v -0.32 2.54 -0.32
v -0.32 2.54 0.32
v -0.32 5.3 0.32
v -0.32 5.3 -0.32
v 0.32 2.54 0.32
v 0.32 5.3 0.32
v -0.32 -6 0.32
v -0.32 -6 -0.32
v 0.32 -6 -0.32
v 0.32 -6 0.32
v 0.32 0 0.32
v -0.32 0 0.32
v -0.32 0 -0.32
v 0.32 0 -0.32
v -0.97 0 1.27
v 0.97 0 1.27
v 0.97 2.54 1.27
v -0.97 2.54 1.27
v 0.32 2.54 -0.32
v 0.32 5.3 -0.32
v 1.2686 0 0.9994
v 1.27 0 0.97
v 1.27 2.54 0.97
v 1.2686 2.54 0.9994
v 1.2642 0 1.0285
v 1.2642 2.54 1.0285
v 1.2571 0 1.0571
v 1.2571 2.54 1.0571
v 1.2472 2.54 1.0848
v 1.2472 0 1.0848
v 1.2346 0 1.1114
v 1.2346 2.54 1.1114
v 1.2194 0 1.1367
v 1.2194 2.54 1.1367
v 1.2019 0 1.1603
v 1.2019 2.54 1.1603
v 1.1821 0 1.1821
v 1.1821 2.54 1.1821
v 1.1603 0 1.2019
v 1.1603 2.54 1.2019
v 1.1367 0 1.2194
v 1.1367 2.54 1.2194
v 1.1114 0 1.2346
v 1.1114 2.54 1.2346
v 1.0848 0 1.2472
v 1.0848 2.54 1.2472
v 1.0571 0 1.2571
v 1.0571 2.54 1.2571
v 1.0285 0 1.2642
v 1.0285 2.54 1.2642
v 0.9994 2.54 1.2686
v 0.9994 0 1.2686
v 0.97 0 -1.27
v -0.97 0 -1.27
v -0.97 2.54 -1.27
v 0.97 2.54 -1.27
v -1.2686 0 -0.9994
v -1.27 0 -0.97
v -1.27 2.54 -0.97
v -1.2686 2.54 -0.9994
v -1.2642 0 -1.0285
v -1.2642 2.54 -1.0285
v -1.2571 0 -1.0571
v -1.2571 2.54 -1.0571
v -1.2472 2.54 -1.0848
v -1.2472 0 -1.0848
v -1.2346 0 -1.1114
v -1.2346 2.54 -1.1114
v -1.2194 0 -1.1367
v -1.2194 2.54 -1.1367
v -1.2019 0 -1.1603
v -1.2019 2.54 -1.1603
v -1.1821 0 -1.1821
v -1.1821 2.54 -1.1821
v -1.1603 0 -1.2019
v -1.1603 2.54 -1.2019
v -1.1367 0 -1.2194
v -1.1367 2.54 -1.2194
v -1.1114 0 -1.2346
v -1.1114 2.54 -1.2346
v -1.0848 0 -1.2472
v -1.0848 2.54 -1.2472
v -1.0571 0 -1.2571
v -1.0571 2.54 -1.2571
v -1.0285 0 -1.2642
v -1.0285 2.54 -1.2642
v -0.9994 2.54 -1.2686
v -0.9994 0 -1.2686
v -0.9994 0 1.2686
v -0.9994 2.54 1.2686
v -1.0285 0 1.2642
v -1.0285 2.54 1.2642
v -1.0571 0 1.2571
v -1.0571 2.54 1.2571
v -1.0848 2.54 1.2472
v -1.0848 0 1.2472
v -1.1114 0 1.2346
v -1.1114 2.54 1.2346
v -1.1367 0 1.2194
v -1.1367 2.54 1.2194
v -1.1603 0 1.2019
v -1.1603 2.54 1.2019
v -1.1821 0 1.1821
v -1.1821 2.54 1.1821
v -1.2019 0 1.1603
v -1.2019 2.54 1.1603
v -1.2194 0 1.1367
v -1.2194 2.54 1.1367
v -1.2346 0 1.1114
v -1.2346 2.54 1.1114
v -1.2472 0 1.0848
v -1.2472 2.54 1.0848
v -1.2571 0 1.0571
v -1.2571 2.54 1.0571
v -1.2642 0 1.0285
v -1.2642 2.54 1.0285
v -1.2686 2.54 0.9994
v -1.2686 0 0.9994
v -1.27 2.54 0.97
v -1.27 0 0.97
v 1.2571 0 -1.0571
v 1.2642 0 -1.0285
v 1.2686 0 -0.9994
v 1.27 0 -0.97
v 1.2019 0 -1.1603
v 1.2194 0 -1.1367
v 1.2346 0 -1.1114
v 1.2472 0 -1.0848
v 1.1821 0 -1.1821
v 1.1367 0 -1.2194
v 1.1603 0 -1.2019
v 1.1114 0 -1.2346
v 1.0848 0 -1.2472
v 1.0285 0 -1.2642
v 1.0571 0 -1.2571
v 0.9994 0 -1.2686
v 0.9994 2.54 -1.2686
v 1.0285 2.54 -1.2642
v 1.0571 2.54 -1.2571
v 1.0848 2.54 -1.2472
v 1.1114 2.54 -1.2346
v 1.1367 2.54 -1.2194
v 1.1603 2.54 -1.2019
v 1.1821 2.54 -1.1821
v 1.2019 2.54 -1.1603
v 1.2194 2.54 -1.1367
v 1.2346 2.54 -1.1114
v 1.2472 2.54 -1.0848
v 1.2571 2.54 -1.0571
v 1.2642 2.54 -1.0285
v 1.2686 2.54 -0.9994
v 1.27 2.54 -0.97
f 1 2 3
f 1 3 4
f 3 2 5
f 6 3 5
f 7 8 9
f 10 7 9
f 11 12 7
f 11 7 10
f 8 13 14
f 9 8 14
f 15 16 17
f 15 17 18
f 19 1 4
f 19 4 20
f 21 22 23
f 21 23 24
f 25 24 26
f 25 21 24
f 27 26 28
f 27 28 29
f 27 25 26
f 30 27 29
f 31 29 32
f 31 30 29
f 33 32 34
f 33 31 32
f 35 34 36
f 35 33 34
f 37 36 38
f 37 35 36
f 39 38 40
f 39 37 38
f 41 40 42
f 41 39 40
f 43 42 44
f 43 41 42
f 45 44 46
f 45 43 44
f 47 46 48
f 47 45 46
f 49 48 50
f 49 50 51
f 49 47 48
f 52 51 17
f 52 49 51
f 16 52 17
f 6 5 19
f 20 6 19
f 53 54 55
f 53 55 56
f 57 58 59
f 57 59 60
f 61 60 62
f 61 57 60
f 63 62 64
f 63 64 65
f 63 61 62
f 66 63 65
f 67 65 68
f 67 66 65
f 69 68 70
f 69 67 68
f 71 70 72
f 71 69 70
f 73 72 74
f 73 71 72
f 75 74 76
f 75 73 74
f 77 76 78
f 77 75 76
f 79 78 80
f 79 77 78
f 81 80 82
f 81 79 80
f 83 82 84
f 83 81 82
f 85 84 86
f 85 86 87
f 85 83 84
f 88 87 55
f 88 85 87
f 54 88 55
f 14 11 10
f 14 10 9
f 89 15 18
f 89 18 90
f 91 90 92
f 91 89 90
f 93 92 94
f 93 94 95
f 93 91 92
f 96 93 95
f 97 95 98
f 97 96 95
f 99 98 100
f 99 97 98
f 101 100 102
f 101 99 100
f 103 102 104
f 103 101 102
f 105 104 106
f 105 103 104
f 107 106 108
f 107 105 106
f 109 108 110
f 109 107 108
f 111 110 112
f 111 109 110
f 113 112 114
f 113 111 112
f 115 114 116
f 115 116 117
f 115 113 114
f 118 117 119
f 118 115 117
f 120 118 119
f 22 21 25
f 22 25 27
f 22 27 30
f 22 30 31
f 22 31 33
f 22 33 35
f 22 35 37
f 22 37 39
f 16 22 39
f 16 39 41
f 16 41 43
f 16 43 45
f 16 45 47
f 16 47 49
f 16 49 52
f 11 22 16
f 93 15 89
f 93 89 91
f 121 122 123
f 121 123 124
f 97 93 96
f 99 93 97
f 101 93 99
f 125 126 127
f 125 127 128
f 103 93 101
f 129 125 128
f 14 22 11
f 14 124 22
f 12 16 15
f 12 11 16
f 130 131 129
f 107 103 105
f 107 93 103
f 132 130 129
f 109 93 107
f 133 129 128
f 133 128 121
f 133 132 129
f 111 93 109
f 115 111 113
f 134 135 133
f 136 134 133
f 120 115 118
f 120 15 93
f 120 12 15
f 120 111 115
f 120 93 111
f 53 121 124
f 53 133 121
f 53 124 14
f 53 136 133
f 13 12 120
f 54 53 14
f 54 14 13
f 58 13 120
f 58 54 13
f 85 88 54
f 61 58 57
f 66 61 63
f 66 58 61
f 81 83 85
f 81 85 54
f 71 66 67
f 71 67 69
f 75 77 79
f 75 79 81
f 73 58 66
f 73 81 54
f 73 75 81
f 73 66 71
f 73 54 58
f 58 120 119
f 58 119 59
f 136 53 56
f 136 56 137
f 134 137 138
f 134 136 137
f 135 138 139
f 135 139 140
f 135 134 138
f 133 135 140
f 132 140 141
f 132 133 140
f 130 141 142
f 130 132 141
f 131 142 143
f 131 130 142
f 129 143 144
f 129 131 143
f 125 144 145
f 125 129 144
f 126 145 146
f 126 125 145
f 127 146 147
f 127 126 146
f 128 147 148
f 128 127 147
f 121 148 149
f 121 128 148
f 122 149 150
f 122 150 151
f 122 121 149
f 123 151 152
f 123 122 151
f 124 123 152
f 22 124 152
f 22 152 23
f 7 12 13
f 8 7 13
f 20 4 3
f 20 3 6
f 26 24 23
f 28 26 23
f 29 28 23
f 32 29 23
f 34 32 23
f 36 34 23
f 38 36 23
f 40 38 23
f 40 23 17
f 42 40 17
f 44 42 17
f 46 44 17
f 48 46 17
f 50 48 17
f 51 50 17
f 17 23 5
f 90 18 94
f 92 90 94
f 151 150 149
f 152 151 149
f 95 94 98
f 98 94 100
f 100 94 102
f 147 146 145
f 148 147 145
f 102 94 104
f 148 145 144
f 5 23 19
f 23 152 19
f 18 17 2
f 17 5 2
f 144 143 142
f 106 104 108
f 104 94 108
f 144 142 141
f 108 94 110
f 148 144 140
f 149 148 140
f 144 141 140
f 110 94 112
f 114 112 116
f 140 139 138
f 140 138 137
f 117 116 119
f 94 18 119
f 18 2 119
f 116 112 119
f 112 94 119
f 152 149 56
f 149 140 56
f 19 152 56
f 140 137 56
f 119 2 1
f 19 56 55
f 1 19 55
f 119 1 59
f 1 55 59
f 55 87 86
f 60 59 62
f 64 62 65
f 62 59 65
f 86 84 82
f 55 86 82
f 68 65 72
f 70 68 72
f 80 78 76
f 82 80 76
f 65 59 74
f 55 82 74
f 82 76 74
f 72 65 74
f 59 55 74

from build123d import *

# Parameters (mm, degrees)
SKETCH_1_W           = 0.64
SKETCH_1_H           = 0.64
EXTRUDE_1_DEPTH      = 2.54
EXTRUDE_2_DEPTH      = 5.3
EXTRUDE_2_DEPTH_BACK = 6
SKETCH_1_2_W         = 0.64
SKETCH_1_2_H         = 0.64


with BuildPart() as part:
    # Эскиз1 → Бобышка-Вытянуть1 (new body)
    with BuildSketch(Plane(origin=(0, 0, 0), x_dir=(1, 0, 0), z_dir=(0, 1, 0))):
        with BuildLine():
            Line((0.97, -1.27), (-0.97, -1.27))
            ThreePointArc((-0.97, -1.27), (-1.182132034, -1.182132034), (-1.27, -0.97))
            Line((-1.27, -0.97), (-1.27, 0.97))
            ThreePointArc((-1.27, 0.97), (-1.182132034, 1.182132034), (-0.97, 1.27))
            Line((-0.97, 1.27), (0.97, 1.27))
            ThreePointArc((0.97, 1.27), (1.182132034, 1.182132034), (1.27, 0.97))
            Line((1.27, 0.97), (1.27, -0.97))
            ThreePointArc((1.27, -0.97), (1.182132034, -1.182132034), (0.97, -1.27))
        make_face()
        Rectangle(SKETCH_1_W, SKETCH_1_H, mode=Mode.SUBTRACT)
    extrude(amount=EXTRUDE_1_DEPTH)

    # Эскиз1<2> → Бобышка-Вытянуть2 (add, two sides: drawn at the far end of the back side and taken through both)
    with BuildSketch(Plane(origin=(0, 0, 0), x_dir=(1, 0, 0), z_dir=(0, 1, 0)).offset(-EXTRUDE_2_DEPTH_BACK)):
        Rectangle(SKETCH_1_2_W, SKETCH_1_2_H)
    extrude(amount=EXTRUDE_2_DEPTH + EXTRUDE_2_DEPTH_BACK)


solid = part.part
